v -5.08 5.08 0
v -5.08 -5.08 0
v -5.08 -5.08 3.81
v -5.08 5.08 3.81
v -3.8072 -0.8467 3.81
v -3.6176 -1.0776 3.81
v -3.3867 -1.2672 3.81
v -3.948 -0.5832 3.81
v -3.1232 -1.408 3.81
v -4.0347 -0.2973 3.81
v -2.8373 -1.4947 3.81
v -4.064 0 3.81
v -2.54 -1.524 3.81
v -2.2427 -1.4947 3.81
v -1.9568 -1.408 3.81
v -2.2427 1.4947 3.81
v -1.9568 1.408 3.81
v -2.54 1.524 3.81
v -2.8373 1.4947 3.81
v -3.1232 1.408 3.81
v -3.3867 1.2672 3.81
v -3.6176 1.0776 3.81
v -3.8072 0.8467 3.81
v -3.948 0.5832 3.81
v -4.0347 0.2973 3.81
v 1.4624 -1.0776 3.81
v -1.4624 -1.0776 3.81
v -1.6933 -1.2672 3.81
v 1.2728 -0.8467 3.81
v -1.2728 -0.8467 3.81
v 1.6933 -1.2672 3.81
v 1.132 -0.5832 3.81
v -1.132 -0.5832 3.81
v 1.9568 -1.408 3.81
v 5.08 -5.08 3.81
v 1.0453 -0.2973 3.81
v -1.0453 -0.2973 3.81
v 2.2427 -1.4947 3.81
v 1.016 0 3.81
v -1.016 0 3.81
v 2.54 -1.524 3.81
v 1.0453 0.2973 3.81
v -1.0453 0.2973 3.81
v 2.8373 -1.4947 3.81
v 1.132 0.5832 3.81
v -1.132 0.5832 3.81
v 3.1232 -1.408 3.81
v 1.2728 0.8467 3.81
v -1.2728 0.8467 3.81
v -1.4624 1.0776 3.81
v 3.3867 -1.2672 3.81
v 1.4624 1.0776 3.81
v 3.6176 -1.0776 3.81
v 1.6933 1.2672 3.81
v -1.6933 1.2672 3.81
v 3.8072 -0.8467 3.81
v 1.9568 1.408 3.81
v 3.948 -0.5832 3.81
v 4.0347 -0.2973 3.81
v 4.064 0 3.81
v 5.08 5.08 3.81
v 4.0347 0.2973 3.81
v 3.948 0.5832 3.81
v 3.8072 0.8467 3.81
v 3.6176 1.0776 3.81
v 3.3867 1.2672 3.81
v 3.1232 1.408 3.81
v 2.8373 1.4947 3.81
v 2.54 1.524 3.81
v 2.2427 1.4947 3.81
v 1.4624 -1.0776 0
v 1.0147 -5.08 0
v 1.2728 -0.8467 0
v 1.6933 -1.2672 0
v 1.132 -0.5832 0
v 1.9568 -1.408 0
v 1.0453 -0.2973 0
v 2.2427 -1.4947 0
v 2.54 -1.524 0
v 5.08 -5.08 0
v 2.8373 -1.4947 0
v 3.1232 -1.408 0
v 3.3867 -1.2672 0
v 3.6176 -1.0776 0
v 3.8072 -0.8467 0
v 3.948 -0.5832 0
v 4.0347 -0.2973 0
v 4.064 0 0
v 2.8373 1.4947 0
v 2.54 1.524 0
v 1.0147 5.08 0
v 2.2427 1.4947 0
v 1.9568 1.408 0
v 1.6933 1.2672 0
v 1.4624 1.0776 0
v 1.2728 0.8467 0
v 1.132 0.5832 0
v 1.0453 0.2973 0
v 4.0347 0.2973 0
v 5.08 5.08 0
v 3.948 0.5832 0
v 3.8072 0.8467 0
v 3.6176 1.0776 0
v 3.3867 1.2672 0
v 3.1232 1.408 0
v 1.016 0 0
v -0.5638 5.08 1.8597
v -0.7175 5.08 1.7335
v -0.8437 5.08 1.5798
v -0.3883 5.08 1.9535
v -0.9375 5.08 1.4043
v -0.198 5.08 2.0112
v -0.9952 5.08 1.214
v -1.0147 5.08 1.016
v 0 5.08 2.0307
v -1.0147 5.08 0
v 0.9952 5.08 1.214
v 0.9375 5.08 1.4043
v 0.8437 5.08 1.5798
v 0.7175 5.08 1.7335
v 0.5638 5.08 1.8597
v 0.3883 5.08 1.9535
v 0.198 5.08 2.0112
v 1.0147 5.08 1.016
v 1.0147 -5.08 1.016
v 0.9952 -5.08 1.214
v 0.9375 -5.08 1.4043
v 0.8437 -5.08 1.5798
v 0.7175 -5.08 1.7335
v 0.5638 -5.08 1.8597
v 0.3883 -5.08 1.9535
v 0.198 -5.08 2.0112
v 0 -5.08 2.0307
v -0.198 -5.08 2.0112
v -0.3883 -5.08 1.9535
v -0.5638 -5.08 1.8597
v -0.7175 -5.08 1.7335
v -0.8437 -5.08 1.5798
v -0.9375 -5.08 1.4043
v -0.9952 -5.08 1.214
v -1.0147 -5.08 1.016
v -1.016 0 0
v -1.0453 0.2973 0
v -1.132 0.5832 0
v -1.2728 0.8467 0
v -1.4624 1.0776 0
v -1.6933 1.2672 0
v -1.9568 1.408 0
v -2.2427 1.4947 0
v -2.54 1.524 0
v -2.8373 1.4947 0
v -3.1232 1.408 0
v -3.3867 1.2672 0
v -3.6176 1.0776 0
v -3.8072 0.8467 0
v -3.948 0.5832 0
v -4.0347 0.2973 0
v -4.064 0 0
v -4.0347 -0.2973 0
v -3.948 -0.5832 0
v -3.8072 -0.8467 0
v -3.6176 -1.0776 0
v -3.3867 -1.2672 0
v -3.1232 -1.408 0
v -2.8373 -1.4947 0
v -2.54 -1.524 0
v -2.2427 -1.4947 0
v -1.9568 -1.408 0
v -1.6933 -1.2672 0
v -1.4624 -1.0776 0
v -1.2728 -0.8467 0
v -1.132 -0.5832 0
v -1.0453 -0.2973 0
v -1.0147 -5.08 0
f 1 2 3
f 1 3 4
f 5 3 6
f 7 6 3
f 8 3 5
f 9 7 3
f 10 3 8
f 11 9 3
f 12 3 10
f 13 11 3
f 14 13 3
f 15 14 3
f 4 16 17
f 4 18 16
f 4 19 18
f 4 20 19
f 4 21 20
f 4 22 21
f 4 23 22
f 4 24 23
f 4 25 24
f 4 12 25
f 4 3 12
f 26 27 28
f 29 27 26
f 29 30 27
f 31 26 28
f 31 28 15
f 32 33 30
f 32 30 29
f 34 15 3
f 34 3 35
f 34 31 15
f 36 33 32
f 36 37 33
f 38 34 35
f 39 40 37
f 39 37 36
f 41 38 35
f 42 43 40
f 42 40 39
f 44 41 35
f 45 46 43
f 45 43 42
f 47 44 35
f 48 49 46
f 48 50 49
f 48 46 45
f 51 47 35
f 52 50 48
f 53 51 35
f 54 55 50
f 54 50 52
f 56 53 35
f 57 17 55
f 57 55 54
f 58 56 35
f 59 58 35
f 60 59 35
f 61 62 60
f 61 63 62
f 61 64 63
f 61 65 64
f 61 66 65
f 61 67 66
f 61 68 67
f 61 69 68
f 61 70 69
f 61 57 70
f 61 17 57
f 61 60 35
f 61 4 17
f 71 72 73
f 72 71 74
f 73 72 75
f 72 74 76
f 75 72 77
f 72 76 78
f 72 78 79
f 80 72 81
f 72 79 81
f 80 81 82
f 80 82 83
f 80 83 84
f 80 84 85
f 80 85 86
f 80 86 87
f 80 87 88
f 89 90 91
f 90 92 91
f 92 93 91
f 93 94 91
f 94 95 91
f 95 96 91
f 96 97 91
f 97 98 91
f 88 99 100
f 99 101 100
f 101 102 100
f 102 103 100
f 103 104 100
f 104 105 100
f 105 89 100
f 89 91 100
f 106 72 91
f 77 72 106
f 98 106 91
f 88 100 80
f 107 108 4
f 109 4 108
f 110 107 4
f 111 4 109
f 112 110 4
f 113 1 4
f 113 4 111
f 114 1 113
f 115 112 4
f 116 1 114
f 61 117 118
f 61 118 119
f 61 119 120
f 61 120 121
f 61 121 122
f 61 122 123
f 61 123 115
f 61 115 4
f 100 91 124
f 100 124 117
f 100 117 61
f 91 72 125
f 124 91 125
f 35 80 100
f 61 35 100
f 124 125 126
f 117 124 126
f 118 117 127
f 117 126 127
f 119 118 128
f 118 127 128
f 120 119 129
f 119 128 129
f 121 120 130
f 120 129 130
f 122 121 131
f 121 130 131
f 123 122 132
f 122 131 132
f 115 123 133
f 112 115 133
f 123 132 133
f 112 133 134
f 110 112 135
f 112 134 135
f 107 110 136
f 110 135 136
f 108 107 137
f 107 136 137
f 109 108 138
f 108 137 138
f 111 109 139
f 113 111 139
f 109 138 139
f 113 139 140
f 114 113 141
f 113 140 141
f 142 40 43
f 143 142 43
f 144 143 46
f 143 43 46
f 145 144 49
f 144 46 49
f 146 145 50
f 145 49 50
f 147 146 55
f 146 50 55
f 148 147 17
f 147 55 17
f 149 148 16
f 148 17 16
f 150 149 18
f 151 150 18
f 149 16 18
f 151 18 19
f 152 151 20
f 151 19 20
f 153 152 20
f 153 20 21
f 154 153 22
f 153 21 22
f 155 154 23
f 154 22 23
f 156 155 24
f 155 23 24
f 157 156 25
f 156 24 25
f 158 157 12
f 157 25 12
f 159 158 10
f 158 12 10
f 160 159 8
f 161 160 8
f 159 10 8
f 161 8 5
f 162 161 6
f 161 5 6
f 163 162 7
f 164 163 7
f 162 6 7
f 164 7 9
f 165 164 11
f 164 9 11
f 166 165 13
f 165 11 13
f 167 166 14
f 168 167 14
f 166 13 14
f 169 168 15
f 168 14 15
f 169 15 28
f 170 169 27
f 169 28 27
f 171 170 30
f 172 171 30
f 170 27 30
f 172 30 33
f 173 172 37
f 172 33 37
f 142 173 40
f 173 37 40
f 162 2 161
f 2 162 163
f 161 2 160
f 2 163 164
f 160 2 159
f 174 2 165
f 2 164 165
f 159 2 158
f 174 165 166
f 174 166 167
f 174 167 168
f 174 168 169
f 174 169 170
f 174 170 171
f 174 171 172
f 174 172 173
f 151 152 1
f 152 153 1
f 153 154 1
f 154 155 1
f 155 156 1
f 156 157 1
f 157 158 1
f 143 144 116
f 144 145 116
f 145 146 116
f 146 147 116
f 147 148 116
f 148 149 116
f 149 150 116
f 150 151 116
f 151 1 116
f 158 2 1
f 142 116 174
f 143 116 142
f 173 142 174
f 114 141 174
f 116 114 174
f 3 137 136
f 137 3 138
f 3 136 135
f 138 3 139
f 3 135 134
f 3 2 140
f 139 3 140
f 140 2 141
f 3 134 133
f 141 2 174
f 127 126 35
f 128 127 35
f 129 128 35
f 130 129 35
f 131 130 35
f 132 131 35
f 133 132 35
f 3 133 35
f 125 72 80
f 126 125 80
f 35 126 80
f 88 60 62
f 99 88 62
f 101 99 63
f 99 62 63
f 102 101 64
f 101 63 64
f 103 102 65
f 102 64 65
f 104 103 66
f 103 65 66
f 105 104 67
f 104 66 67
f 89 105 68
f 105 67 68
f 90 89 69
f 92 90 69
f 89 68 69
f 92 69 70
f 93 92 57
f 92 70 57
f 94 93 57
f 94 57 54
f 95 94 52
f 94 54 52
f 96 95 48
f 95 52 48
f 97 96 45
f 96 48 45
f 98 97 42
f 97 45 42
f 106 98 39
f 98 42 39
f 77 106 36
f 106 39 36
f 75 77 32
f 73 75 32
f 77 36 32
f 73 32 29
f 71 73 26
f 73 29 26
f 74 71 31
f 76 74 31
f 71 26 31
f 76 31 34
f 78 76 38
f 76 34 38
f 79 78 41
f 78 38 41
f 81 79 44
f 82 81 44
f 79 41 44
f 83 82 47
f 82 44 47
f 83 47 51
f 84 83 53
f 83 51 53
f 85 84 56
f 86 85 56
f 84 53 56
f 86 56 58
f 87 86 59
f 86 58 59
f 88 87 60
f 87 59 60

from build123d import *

# Parameters (mm, degrees)
SKETCH1_W           = 10.16
SKETCH1_H           = 10.16
BOSS_EXTRUDE1_DEPTH = 3.81
SKETCH2_R           = 1.524
CUT_EXTRUDE1_DEPTH  = 3.81
SKETCH3_R           = 1.01473
CUT_EXTRUDE3_DEPTH  = 10.16


with BuildPart() as part:
    # Sketch1 → Boss-Extrude1 (new body)
    with BuildSketch(Plane.XY):
        Rectangle(SKETCH1_W, SKETCH1_H)
    extrude(amount=BOSS_EXTRUDE1_DEPTH)

    # Sketch2 → Cut-Extrude1 (cut)
    with BuildSketch(Plane.XY.offset(3.81)):
        with Locations((2.54, 0)):
            Circle(SKETCH2_R)
        with Locations((-2.54, 0)):
            Circle(SKETCH2_R)
    extrude(amount=-CUT_EXTRUDE1_DEPTH, mode=Mode.SUBTRACT)

    # Sketch3 → Cut-Extrude3 (cut)
    with BuildSketch(Plane.XZ.offset(5.08)):
        with Locations((0, 1.016)):
            Circle(SKETCH3_R)
        with BuildLine():
            ThreePointArc((1.01473, 1.016), (0, 0.00127), (-1.01473, 1.016))
            Line((-1.01473, 1.016), (-1.01473, 0))
            Line((-1.01473, 0), (1.01473, 0))
            Line((1.01473, 0), (1.01473, 1.016))
        make_face()
    extrude(amount=-CUT_EXTRUDE3_DEPTH, mode=Mode.SUBTRACT)


solid = part.part
